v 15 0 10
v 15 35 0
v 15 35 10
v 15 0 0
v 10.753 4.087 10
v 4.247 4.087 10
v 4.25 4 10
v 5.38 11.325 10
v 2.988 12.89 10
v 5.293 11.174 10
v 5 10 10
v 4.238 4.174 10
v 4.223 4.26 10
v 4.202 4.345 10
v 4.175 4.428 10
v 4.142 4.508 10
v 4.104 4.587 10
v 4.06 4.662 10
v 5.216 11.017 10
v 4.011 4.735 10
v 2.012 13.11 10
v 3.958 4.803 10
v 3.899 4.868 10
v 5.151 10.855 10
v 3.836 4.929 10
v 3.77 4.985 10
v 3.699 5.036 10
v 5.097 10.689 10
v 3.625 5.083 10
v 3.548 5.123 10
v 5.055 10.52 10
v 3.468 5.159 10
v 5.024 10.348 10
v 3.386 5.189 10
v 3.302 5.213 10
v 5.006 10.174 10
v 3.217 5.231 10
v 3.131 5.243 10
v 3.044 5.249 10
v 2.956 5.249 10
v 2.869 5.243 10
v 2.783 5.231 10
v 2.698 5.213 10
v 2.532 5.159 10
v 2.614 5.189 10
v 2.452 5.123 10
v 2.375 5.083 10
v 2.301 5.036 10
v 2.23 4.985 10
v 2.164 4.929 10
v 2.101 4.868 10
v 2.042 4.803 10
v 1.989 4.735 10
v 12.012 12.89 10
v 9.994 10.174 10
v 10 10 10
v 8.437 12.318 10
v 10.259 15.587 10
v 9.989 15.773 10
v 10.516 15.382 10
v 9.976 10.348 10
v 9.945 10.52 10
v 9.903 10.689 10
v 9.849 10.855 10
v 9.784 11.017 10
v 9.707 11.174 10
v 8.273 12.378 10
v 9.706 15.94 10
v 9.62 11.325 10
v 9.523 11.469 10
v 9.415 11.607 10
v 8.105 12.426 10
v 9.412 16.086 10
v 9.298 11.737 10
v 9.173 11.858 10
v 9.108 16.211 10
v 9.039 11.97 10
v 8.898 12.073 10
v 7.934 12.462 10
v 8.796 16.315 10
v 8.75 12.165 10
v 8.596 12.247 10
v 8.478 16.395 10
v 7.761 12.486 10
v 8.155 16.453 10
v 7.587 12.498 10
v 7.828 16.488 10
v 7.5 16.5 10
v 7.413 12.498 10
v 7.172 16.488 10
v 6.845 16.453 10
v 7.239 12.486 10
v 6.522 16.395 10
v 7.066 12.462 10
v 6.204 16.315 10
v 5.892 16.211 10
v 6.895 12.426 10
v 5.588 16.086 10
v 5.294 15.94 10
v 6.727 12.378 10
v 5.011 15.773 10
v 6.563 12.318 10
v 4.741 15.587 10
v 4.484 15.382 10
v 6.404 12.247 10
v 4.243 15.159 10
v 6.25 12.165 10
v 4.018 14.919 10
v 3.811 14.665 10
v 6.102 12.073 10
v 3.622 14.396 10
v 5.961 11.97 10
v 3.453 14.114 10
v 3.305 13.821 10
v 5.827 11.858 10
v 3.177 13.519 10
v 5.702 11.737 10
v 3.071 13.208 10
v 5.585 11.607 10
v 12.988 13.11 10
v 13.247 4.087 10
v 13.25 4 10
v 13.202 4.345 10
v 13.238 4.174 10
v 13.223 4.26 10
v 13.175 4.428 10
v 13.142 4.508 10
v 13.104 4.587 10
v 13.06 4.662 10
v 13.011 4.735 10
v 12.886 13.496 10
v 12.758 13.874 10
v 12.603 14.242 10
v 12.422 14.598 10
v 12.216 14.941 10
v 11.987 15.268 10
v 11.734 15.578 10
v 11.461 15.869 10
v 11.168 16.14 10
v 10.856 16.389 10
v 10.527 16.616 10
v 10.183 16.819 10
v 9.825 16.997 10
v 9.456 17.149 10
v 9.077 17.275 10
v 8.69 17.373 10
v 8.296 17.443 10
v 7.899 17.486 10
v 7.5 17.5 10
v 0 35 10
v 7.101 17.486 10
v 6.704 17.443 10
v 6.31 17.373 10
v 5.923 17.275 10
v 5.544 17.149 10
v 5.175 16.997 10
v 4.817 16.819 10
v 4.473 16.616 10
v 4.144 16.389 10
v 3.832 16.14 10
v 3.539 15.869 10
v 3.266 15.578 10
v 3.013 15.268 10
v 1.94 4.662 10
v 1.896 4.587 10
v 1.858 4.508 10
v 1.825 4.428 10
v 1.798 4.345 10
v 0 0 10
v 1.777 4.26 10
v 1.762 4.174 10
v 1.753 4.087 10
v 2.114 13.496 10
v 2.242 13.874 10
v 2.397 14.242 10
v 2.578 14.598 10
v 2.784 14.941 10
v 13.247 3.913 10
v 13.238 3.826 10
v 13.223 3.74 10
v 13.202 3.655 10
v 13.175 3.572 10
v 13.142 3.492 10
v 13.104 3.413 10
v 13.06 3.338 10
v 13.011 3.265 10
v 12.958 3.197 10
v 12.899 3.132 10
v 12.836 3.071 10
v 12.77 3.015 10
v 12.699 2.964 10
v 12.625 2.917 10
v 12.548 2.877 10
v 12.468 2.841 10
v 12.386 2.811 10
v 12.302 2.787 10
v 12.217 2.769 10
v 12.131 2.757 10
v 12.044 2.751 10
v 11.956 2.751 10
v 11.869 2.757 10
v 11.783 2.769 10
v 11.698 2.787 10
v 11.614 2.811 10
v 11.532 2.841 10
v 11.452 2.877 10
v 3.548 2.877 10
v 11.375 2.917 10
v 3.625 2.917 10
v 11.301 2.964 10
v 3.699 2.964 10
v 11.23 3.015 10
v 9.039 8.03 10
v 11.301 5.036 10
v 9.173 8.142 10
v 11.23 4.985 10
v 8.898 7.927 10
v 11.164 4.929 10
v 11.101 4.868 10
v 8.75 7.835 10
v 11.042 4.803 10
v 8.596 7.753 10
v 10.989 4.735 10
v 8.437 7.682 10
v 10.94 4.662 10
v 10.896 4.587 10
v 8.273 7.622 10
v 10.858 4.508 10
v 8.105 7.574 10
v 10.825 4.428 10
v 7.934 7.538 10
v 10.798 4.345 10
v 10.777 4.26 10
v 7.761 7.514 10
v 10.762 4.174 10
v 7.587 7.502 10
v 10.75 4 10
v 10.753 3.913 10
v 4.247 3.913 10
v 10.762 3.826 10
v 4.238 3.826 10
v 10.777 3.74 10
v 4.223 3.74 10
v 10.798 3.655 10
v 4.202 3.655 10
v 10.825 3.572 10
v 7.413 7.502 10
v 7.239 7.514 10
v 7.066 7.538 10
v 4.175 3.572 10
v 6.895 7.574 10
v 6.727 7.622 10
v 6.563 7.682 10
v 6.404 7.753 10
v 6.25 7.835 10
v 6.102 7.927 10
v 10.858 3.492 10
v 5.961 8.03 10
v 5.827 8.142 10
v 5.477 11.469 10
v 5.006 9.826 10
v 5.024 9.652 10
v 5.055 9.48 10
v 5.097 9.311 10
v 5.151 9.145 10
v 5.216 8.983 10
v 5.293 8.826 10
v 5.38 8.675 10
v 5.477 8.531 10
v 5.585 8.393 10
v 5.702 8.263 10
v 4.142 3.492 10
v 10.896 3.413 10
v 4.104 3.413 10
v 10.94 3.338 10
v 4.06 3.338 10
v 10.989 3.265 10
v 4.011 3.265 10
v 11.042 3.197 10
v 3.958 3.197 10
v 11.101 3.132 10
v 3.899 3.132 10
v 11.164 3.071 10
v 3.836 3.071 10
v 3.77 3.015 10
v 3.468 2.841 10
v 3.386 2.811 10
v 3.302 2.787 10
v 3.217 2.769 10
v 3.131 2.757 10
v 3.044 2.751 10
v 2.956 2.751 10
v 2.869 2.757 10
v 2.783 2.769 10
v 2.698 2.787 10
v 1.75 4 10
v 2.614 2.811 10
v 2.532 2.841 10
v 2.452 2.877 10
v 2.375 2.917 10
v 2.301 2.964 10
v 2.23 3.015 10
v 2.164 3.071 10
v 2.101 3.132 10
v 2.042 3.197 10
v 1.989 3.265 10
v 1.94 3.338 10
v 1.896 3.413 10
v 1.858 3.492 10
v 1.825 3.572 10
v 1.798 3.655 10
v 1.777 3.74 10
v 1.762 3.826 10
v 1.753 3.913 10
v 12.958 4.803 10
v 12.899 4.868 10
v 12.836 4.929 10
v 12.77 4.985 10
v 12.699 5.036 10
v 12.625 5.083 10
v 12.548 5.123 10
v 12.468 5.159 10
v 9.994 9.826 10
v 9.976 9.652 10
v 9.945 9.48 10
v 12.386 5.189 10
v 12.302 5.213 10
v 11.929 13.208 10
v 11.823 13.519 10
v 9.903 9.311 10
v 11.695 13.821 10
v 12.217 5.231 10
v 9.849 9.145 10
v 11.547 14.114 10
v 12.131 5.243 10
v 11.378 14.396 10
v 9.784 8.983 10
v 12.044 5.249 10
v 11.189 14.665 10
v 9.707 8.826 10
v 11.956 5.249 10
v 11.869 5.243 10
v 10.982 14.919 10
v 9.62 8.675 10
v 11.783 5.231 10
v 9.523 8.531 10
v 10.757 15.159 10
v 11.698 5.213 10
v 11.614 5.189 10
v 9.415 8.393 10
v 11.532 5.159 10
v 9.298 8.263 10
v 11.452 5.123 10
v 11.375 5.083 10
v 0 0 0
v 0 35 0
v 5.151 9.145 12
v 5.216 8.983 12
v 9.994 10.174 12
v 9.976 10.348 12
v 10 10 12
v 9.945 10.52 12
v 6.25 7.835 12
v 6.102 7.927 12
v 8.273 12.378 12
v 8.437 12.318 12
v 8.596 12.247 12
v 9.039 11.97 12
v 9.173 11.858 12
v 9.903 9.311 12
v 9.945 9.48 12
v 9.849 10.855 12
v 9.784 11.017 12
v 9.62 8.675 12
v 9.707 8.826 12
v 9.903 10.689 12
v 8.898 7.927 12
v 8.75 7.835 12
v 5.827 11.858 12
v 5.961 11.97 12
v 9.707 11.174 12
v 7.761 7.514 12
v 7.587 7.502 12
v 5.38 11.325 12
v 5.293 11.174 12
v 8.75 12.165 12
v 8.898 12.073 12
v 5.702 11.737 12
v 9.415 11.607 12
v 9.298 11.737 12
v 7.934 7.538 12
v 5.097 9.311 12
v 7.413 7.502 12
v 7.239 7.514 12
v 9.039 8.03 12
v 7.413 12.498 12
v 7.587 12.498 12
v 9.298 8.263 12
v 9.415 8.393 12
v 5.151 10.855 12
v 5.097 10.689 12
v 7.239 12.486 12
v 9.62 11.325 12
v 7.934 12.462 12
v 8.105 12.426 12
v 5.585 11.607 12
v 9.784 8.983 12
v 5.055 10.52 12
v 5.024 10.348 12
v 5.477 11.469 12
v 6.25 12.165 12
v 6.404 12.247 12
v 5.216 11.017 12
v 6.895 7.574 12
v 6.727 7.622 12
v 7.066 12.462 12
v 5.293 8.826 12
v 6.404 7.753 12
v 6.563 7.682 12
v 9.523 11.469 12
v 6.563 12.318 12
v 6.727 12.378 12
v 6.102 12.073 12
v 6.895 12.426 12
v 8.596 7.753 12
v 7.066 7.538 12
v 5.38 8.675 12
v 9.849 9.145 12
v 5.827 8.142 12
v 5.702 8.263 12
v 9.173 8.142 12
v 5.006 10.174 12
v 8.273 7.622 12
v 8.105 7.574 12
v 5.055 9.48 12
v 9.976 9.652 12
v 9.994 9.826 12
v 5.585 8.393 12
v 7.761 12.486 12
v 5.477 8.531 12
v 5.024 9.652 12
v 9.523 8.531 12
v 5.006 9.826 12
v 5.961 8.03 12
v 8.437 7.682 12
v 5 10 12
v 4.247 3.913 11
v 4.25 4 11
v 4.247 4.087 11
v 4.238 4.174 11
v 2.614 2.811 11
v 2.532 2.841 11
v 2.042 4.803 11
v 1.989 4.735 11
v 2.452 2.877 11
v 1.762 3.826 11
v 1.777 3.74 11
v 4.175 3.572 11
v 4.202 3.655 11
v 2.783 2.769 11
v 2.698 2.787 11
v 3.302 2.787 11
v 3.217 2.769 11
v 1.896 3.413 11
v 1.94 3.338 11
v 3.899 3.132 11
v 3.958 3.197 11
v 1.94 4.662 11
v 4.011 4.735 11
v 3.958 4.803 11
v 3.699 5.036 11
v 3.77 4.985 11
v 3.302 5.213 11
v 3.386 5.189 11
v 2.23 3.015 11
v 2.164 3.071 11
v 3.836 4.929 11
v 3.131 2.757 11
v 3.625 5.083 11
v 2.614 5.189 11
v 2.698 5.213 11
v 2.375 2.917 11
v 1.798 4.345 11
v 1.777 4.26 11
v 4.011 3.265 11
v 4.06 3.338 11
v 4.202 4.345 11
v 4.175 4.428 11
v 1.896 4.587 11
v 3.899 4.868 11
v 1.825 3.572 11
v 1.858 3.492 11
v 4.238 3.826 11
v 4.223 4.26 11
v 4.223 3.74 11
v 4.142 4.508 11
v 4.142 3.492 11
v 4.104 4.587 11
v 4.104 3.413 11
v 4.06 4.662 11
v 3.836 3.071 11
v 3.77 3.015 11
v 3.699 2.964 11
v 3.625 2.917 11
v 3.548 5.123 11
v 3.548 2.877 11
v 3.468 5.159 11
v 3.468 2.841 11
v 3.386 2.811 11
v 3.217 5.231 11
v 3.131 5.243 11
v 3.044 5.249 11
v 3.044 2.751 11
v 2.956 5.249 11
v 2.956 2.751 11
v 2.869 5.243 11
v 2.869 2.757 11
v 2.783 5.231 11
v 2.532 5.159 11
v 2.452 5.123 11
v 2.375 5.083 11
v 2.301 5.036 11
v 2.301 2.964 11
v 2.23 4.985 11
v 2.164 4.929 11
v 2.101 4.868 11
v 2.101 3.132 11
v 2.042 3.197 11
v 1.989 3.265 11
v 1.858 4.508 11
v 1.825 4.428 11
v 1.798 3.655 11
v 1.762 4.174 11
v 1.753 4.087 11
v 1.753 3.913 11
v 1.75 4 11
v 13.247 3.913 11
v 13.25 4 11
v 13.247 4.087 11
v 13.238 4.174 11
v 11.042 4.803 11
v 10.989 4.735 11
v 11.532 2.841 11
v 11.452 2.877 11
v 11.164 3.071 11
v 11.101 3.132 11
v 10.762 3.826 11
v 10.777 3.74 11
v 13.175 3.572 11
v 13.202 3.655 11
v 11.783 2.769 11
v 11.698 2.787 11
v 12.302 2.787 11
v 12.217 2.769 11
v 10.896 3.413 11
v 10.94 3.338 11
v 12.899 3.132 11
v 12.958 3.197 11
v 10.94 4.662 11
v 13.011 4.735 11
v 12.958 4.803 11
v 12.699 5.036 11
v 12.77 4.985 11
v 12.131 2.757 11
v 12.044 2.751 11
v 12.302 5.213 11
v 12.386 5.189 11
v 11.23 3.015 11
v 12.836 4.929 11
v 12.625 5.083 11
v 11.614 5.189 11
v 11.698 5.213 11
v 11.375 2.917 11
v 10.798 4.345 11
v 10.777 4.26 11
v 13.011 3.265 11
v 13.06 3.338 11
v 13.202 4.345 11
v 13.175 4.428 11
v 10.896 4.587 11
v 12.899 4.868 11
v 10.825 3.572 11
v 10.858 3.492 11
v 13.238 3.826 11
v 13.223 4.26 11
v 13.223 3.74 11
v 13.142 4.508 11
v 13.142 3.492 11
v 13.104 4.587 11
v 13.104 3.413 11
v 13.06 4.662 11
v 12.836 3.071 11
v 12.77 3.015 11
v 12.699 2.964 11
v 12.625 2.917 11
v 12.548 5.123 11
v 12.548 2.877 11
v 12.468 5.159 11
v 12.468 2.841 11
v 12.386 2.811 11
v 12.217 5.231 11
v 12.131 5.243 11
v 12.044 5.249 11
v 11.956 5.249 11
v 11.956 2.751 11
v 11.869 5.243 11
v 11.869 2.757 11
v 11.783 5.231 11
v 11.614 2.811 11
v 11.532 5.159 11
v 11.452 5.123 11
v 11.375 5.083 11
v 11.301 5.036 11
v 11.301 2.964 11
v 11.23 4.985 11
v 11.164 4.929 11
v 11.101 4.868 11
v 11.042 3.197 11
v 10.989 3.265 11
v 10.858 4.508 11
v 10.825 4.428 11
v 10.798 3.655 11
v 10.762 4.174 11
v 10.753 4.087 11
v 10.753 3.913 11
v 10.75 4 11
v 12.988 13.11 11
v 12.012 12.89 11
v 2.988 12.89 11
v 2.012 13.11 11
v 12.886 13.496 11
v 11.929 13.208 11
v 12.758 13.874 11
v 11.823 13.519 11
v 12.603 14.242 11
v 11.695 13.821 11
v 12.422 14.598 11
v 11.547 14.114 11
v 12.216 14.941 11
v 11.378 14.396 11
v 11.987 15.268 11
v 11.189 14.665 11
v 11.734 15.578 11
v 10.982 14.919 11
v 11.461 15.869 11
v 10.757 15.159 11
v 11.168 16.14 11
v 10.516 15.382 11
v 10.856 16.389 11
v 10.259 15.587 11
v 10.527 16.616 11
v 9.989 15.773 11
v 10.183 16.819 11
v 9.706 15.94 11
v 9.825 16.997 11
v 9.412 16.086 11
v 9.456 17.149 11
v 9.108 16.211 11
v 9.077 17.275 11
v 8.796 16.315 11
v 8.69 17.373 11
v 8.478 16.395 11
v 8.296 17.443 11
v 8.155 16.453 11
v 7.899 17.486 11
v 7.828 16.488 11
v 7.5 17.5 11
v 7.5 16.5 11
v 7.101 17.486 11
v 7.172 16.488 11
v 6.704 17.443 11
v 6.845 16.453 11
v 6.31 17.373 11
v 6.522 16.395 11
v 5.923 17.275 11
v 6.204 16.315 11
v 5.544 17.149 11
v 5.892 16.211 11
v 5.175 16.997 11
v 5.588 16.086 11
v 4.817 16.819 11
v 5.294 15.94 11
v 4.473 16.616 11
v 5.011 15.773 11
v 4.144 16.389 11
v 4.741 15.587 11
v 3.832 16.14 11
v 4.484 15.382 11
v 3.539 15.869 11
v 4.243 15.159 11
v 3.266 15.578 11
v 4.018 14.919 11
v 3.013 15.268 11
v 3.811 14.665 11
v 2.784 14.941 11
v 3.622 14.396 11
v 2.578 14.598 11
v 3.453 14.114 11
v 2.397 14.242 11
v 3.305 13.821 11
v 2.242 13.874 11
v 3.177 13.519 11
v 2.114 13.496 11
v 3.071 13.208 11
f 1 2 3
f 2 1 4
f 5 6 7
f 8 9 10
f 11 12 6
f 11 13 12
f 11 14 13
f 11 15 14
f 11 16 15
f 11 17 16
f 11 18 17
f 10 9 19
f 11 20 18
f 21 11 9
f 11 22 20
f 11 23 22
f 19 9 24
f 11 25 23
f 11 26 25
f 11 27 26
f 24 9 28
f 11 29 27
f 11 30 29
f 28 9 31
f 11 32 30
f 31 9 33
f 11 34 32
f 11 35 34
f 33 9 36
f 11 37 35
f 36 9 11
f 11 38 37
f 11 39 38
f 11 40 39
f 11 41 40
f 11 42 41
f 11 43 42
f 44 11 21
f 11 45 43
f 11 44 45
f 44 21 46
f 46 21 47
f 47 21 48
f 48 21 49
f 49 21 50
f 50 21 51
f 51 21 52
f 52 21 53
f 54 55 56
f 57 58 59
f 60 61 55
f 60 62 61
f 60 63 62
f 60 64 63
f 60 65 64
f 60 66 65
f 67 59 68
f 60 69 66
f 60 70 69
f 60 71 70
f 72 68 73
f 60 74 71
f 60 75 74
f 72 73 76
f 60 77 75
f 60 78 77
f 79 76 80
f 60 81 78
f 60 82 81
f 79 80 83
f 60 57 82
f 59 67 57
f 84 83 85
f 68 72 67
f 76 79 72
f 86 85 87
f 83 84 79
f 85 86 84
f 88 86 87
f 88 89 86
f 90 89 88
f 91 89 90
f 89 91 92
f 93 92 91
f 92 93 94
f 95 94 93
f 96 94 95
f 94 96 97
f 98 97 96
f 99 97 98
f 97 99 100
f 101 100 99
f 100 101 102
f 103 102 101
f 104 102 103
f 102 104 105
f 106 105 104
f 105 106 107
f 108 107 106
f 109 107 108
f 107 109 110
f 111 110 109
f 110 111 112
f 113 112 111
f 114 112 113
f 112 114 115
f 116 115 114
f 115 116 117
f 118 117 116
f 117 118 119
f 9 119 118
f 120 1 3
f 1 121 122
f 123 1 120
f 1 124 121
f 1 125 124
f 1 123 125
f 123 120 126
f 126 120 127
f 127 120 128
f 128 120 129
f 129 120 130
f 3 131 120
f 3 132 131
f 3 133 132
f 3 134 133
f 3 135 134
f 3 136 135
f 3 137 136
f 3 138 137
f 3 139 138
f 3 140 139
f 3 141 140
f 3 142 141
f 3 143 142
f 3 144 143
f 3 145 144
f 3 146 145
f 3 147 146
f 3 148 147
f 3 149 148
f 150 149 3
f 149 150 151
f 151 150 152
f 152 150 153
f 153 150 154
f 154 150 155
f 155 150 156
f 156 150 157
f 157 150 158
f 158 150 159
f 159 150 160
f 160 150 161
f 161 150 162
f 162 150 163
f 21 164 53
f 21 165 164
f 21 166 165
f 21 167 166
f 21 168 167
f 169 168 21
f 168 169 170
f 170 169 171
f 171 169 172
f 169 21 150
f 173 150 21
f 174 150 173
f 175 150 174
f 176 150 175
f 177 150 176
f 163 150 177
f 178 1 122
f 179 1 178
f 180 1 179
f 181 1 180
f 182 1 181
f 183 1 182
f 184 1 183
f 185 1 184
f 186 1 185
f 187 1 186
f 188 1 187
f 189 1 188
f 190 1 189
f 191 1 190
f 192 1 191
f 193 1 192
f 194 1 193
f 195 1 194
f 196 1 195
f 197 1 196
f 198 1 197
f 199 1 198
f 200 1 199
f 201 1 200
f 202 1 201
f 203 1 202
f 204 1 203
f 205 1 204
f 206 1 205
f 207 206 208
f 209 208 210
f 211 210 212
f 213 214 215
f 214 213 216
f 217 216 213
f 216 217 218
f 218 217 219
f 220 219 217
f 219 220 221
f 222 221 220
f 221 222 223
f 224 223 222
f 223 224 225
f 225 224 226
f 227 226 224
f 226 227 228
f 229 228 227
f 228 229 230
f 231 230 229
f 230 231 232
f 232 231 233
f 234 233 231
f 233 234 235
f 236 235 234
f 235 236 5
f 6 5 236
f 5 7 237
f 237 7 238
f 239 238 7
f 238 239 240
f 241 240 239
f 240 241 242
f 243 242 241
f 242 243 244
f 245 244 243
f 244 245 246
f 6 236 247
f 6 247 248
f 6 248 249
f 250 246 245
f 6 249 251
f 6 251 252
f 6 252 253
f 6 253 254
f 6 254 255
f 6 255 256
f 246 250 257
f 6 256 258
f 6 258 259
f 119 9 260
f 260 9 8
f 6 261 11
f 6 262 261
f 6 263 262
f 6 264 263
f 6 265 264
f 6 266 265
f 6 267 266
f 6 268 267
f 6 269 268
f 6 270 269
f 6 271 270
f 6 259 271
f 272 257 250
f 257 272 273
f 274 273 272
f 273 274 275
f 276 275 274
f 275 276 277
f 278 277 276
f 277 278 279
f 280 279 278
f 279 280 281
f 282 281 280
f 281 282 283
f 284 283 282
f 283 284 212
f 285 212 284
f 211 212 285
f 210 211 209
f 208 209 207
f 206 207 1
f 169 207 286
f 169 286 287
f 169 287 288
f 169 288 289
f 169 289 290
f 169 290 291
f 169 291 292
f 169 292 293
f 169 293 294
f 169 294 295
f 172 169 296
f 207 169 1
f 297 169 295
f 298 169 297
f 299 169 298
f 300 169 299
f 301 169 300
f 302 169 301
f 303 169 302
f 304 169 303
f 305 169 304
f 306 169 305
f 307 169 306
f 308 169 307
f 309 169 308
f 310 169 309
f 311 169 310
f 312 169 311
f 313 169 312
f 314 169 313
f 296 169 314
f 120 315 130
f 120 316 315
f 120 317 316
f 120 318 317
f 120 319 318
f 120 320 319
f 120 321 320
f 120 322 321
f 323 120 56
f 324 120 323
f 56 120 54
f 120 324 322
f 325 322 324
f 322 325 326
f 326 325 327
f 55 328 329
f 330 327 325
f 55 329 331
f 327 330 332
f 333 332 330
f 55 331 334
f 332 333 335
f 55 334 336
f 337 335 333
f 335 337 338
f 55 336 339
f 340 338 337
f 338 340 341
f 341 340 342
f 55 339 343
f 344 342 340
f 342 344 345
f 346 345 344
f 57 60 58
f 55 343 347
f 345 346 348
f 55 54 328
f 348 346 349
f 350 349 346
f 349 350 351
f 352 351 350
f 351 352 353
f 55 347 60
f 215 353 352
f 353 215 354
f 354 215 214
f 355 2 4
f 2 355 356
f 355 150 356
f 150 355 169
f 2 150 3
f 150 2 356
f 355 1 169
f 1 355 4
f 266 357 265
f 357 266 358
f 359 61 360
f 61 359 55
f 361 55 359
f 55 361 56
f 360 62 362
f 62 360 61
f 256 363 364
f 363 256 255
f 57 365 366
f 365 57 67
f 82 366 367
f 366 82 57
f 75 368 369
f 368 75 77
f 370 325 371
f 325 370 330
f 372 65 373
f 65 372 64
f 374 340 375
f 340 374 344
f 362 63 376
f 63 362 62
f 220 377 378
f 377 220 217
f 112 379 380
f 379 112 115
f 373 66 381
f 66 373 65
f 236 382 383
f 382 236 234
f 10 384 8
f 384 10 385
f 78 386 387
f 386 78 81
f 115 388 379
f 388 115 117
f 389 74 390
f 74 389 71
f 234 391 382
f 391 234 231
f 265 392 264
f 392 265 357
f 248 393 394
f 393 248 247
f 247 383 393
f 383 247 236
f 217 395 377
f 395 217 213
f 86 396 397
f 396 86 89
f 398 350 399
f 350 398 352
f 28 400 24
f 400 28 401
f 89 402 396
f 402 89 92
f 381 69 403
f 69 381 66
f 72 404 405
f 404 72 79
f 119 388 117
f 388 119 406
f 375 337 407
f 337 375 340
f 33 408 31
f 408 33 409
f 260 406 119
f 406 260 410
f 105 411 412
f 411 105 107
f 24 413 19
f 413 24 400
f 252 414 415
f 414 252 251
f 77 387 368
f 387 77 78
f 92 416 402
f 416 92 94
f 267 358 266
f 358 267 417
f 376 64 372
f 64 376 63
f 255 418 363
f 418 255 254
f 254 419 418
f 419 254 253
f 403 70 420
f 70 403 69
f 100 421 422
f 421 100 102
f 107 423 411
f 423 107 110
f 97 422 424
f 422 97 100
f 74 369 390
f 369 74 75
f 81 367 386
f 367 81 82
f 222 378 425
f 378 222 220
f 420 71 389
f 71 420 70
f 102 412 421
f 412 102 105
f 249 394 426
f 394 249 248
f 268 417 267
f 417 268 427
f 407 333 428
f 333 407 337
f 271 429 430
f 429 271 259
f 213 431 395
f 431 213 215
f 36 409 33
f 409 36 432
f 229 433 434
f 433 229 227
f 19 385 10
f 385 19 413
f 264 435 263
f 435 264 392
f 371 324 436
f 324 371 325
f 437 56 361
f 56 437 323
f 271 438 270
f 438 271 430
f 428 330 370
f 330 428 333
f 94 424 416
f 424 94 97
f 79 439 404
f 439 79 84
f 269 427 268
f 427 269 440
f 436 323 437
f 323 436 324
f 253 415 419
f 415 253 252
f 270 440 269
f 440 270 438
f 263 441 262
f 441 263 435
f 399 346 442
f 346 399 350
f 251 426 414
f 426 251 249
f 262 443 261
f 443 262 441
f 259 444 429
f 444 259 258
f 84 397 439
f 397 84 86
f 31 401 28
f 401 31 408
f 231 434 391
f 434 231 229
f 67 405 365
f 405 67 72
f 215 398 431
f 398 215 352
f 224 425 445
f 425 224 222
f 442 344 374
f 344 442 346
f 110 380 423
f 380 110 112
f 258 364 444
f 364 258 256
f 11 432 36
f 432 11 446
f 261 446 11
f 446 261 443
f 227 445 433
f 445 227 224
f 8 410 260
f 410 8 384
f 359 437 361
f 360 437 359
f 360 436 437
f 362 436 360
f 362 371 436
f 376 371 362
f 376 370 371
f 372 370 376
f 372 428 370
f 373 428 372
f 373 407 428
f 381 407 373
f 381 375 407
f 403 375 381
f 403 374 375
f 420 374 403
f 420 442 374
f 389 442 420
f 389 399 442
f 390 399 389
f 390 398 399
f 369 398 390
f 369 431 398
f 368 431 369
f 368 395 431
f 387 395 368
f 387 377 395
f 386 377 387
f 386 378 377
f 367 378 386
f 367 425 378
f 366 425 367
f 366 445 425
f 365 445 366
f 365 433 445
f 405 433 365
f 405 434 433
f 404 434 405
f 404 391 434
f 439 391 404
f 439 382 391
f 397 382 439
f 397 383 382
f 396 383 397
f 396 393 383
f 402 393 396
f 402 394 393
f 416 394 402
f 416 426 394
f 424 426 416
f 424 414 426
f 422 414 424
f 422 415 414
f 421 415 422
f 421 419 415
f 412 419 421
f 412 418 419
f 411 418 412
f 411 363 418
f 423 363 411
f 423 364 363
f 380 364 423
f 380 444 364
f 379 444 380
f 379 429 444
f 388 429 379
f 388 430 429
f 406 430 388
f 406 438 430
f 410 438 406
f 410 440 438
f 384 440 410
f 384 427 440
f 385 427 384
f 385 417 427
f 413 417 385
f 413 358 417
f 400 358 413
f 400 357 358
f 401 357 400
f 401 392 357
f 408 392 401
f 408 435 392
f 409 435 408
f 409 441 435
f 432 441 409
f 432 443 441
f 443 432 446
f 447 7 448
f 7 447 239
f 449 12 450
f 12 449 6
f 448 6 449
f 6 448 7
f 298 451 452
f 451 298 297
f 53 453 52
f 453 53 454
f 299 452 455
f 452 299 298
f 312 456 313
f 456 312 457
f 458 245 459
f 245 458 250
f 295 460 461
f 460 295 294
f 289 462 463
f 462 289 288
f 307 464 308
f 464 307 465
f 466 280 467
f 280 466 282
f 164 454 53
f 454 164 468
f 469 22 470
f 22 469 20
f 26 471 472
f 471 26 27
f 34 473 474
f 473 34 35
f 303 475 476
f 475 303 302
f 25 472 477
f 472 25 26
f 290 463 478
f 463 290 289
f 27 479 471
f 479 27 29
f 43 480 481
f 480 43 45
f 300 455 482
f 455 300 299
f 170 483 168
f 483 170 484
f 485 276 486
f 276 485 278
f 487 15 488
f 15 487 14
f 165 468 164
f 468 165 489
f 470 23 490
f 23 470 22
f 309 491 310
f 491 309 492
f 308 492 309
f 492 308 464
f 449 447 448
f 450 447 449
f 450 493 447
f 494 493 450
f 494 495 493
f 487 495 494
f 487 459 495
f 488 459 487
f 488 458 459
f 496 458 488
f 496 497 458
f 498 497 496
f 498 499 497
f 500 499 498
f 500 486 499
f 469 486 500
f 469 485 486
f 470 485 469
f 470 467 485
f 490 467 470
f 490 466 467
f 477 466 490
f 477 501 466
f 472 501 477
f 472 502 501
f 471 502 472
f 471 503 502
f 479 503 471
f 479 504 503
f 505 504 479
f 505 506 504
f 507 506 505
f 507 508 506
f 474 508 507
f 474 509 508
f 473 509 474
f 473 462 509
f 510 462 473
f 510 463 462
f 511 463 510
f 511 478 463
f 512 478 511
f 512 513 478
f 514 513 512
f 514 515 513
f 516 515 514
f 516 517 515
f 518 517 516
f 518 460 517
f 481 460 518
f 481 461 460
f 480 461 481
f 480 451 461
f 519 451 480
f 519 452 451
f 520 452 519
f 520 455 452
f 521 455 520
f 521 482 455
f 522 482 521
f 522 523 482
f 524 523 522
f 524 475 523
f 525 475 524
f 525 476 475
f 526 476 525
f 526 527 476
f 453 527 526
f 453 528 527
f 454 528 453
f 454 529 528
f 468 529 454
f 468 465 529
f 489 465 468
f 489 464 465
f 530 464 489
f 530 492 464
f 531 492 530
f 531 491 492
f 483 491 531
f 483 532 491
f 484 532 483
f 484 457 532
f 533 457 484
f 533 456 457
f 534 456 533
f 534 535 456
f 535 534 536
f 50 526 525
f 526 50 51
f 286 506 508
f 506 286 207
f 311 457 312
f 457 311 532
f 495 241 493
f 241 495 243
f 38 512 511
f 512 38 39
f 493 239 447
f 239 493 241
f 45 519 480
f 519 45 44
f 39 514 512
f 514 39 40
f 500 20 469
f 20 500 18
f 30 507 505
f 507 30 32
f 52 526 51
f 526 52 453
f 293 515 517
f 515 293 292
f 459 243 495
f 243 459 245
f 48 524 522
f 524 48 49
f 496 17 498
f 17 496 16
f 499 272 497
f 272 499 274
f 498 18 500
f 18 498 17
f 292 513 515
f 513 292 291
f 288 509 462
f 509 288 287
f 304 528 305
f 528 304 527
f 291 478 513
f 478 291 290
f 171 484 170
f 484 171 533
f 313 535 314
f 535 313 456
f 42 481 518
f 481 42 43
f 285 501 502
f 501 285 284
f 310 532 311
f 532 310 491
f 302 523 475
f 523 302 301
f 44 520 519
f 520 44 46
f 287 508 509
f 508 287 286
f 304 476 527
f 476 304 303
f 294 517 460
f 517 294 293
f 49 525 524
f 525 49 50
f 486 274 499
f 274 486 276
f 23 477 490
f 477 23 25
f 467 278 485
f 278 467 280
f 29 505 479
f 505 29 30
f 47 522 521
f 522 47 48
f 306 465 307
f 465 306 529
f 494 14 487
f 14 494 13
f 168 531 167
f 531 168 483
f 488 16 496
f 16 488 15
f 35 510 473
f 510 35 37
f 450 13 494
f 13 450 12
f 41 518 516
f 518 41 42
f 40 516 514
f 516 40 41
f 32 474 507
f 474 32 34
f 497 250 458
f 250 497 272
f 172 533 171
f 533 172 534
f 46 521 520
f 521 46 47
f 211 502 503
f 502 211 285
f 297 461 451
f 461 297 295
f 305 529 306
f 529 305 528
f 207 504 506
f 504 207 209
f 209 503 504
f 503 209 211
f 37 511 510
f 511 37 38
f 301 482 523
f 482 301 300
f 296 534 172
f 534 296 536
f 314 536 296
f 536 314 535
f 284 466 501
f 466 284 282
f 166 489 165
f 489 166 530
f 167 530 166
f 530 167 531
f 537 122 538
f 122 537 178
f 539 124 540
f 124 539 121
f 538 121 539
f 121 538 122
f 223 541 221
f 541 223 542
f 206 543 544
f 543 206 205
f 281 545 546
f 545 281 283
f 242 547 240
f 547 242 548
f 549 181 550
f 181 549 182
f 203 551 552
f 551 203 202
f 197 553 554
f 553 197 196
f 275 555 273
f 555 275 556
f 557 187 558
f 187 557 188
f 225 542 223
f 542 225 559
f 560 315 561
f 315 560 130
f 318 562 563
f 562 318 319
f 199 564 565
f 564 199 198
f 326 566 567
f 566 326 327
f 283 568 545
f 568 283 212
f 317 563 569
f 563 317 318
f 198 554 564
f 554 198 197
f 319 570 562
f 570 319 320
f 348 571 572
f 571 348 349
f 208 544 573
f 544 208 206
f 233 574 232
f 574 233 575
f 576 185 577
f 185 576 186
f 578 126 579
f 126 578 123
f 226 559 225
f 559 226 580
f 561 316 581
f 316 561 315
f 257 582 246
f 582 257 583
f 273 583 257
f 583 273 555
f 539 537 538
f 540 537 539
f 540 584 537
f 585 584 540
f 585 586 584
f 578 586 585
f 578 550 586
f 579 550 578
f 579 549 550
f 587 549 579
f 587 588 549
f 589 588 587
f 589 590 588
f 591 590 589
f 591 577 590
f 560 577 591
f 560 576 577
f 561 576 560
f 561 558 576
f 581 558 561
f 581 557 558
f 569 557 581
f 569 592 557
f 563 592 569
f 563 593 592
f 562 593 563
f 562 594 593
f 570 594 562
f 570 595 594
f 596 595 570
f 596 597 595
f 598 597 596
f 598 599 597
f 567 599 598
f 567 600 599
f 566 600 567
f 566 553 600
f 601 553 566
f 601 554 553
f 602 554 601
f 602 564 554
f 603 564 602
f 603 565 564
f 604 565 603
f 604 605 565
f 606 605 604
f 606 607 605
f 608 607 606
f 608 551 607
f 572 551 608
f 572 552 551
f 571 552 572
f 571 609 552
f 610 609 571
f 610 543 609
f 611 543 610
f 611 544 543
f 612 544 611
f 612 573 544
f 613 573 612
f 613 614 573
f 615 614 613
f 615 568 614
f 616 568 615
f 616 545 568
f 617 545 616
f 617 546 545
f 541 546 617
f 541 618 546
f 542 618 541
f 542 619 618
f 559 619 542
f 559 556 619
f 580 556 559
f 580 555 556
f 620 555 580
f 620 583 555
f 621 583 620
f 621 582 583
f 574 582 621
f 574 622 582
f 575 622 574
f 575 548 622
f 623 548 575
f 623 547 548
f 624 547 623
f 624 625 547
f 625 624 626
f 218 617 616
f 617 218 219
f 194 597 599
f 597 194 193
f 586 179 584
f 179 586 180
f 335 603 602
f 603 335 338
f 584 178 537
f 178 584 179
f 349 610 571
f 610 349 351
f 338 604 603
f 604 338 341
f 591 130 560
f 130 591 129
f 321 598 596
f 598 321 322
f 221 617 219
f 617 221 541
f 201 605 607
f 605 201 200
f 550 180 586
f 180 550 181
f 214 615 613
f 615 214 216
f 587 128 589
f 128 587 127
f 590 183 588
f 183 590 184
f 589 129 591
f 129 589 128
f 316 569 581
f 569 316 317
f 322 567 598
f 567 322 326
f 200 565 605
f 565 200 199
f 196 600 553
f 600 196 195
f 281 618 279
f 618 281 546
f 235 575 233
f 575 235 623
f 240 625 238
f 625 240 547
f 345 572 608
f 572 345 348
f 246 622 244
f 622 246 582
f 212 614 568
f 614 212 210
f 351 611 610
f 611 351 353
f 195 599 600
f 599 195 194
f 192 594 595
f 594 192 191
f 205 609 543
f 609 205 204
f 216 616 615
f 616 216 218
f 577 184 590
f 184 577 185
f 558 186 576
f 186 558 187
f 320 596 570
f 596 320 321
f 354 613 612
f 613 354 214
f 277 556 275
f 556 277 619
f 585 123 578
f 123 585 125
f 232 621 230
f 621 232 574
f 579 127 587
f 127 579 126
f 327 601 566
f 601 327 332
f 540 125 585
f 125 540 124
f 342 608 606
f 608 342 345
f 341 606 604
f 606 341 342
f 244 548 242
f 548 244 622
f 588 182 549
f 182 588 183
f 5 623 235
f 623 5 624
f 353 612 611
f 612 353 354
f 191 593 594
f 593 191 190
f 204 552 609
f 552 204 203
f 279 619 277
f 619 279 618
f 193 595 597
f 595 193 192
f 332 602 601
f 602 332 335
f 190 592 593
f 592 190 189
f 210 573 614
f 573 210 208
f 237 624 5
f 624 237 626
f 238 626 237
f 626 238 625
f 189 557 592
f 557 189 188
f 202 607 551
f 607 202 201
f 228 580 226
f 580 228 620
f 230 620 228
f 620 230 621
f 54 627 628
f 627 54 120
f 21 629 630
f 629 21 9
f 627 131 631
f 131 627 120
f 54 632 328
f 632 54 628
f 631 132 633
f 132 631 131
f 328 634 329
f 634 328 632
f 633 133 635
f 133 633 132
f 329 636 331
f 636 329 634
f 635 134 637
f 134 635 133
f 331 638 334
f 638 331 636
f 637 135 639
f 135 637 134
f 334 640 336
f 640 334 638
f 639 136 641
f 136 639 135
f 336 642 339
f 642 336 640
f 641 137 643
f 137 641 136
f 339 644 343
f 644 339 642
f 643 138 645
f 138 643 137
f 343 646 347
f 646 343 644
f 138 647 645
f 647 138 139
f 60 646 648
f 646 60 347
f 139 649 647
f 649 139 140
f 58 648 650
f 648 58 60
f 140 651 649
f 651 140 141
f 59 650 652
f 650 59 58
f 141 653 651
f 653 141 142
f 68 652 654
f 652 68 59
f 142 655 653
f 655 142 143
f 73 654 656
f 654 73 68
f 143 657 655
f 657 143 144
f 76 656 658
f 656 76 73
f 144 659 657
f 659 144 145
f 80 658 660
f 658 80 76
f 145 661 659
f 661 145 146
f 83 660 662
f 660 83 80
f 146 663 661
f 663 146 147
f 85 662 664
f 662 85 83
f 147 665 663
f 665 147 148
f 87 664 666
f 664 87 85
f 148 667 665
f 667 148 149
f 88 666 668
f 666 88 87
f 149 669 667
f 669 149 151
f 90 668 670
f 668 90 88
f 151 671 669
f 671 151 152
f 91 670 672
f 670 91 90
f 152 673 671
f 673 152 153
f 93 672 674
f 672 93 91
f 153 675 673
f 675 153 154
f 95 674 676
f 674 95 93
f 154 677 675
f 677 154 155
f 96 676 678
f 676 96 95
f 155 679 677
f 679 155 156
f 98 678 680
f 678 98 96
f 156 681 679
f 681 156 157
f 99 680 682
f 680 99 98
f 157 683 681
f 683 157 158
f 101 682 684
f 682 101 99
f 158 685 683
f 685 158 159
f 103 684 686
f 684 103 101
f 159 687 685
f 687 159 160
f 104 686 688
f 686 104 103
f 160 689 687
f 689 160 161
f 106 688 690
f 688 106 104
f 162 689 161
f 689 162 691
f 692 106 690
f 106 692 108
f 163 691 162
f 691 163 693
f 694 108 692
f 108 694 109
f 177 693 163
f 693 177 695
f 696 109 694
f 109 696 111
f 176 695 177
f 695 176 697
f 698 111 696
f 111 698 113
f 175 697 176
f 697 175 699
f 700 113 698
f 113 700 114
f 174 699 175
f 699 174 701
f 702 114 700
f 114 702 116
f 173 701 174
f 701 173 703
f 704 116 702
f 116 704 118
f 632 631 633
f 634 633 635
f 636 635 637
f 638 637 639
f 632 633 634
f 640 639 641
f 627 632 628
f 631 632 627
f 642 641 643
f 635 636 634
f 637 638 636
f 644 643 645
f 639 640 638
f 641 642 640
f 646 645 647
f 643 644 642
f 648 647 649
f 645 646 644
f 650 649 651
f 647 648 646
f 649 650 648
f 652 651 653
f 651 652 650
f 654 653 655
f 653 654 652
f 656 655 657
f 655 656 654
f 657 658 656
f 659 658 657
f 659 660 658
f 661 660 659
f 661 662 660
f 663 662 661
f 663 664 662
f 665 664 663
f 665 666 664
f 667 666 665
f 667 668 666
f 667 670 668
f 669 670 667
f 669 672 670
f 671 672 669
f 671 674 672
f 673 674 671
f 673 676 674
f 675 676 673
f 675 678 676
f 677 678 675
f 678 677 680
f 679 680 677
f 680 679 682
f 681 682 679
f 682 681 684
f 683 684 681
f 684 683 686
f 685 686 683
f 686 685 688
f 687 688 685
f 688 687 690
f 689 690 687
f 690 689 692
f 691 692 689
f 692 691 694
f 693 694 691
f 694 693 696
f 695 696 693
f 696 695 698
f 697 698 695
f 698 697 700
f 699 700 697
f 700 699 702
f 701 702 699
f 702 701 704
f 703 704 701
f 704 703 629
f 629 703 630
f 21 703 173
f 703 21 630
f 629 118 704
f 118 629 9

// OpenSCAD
$fn = 90;

cube([15, 35, 10]);

// nose
translate([7.5, 10, 10]) cylinder(d = 5, h = 2);

// eyes
translate([3, 4, 10]) cylinder(d = 2.5, h = 1);
translate([12, 4, 10]) cylinder(d = 2.5, h = 1);

// mouth
translate([7.5, 13, 11]) rotate([0, 0, 90]) {

    width = 1;   // width of rectangle
    height = 1;   // height of rectangle
    r = 20;       // radius of the curve
    a = 30;       // angle of the curve

    curve(width, height, 10, 4);
}

module curve(width, height, length, dh) {
    r = (pow(length/2, 2) + pow(dh, 2))/(2*dh);
    a = 2*asin((length/2)/r);
    translate([-(r -dh), 0, -width/2]) rotate([0, 0, -a/2])         rotate_extrude(angle = a) translate([r, 0, 0]) square(size = [height, width], center = true);
}
